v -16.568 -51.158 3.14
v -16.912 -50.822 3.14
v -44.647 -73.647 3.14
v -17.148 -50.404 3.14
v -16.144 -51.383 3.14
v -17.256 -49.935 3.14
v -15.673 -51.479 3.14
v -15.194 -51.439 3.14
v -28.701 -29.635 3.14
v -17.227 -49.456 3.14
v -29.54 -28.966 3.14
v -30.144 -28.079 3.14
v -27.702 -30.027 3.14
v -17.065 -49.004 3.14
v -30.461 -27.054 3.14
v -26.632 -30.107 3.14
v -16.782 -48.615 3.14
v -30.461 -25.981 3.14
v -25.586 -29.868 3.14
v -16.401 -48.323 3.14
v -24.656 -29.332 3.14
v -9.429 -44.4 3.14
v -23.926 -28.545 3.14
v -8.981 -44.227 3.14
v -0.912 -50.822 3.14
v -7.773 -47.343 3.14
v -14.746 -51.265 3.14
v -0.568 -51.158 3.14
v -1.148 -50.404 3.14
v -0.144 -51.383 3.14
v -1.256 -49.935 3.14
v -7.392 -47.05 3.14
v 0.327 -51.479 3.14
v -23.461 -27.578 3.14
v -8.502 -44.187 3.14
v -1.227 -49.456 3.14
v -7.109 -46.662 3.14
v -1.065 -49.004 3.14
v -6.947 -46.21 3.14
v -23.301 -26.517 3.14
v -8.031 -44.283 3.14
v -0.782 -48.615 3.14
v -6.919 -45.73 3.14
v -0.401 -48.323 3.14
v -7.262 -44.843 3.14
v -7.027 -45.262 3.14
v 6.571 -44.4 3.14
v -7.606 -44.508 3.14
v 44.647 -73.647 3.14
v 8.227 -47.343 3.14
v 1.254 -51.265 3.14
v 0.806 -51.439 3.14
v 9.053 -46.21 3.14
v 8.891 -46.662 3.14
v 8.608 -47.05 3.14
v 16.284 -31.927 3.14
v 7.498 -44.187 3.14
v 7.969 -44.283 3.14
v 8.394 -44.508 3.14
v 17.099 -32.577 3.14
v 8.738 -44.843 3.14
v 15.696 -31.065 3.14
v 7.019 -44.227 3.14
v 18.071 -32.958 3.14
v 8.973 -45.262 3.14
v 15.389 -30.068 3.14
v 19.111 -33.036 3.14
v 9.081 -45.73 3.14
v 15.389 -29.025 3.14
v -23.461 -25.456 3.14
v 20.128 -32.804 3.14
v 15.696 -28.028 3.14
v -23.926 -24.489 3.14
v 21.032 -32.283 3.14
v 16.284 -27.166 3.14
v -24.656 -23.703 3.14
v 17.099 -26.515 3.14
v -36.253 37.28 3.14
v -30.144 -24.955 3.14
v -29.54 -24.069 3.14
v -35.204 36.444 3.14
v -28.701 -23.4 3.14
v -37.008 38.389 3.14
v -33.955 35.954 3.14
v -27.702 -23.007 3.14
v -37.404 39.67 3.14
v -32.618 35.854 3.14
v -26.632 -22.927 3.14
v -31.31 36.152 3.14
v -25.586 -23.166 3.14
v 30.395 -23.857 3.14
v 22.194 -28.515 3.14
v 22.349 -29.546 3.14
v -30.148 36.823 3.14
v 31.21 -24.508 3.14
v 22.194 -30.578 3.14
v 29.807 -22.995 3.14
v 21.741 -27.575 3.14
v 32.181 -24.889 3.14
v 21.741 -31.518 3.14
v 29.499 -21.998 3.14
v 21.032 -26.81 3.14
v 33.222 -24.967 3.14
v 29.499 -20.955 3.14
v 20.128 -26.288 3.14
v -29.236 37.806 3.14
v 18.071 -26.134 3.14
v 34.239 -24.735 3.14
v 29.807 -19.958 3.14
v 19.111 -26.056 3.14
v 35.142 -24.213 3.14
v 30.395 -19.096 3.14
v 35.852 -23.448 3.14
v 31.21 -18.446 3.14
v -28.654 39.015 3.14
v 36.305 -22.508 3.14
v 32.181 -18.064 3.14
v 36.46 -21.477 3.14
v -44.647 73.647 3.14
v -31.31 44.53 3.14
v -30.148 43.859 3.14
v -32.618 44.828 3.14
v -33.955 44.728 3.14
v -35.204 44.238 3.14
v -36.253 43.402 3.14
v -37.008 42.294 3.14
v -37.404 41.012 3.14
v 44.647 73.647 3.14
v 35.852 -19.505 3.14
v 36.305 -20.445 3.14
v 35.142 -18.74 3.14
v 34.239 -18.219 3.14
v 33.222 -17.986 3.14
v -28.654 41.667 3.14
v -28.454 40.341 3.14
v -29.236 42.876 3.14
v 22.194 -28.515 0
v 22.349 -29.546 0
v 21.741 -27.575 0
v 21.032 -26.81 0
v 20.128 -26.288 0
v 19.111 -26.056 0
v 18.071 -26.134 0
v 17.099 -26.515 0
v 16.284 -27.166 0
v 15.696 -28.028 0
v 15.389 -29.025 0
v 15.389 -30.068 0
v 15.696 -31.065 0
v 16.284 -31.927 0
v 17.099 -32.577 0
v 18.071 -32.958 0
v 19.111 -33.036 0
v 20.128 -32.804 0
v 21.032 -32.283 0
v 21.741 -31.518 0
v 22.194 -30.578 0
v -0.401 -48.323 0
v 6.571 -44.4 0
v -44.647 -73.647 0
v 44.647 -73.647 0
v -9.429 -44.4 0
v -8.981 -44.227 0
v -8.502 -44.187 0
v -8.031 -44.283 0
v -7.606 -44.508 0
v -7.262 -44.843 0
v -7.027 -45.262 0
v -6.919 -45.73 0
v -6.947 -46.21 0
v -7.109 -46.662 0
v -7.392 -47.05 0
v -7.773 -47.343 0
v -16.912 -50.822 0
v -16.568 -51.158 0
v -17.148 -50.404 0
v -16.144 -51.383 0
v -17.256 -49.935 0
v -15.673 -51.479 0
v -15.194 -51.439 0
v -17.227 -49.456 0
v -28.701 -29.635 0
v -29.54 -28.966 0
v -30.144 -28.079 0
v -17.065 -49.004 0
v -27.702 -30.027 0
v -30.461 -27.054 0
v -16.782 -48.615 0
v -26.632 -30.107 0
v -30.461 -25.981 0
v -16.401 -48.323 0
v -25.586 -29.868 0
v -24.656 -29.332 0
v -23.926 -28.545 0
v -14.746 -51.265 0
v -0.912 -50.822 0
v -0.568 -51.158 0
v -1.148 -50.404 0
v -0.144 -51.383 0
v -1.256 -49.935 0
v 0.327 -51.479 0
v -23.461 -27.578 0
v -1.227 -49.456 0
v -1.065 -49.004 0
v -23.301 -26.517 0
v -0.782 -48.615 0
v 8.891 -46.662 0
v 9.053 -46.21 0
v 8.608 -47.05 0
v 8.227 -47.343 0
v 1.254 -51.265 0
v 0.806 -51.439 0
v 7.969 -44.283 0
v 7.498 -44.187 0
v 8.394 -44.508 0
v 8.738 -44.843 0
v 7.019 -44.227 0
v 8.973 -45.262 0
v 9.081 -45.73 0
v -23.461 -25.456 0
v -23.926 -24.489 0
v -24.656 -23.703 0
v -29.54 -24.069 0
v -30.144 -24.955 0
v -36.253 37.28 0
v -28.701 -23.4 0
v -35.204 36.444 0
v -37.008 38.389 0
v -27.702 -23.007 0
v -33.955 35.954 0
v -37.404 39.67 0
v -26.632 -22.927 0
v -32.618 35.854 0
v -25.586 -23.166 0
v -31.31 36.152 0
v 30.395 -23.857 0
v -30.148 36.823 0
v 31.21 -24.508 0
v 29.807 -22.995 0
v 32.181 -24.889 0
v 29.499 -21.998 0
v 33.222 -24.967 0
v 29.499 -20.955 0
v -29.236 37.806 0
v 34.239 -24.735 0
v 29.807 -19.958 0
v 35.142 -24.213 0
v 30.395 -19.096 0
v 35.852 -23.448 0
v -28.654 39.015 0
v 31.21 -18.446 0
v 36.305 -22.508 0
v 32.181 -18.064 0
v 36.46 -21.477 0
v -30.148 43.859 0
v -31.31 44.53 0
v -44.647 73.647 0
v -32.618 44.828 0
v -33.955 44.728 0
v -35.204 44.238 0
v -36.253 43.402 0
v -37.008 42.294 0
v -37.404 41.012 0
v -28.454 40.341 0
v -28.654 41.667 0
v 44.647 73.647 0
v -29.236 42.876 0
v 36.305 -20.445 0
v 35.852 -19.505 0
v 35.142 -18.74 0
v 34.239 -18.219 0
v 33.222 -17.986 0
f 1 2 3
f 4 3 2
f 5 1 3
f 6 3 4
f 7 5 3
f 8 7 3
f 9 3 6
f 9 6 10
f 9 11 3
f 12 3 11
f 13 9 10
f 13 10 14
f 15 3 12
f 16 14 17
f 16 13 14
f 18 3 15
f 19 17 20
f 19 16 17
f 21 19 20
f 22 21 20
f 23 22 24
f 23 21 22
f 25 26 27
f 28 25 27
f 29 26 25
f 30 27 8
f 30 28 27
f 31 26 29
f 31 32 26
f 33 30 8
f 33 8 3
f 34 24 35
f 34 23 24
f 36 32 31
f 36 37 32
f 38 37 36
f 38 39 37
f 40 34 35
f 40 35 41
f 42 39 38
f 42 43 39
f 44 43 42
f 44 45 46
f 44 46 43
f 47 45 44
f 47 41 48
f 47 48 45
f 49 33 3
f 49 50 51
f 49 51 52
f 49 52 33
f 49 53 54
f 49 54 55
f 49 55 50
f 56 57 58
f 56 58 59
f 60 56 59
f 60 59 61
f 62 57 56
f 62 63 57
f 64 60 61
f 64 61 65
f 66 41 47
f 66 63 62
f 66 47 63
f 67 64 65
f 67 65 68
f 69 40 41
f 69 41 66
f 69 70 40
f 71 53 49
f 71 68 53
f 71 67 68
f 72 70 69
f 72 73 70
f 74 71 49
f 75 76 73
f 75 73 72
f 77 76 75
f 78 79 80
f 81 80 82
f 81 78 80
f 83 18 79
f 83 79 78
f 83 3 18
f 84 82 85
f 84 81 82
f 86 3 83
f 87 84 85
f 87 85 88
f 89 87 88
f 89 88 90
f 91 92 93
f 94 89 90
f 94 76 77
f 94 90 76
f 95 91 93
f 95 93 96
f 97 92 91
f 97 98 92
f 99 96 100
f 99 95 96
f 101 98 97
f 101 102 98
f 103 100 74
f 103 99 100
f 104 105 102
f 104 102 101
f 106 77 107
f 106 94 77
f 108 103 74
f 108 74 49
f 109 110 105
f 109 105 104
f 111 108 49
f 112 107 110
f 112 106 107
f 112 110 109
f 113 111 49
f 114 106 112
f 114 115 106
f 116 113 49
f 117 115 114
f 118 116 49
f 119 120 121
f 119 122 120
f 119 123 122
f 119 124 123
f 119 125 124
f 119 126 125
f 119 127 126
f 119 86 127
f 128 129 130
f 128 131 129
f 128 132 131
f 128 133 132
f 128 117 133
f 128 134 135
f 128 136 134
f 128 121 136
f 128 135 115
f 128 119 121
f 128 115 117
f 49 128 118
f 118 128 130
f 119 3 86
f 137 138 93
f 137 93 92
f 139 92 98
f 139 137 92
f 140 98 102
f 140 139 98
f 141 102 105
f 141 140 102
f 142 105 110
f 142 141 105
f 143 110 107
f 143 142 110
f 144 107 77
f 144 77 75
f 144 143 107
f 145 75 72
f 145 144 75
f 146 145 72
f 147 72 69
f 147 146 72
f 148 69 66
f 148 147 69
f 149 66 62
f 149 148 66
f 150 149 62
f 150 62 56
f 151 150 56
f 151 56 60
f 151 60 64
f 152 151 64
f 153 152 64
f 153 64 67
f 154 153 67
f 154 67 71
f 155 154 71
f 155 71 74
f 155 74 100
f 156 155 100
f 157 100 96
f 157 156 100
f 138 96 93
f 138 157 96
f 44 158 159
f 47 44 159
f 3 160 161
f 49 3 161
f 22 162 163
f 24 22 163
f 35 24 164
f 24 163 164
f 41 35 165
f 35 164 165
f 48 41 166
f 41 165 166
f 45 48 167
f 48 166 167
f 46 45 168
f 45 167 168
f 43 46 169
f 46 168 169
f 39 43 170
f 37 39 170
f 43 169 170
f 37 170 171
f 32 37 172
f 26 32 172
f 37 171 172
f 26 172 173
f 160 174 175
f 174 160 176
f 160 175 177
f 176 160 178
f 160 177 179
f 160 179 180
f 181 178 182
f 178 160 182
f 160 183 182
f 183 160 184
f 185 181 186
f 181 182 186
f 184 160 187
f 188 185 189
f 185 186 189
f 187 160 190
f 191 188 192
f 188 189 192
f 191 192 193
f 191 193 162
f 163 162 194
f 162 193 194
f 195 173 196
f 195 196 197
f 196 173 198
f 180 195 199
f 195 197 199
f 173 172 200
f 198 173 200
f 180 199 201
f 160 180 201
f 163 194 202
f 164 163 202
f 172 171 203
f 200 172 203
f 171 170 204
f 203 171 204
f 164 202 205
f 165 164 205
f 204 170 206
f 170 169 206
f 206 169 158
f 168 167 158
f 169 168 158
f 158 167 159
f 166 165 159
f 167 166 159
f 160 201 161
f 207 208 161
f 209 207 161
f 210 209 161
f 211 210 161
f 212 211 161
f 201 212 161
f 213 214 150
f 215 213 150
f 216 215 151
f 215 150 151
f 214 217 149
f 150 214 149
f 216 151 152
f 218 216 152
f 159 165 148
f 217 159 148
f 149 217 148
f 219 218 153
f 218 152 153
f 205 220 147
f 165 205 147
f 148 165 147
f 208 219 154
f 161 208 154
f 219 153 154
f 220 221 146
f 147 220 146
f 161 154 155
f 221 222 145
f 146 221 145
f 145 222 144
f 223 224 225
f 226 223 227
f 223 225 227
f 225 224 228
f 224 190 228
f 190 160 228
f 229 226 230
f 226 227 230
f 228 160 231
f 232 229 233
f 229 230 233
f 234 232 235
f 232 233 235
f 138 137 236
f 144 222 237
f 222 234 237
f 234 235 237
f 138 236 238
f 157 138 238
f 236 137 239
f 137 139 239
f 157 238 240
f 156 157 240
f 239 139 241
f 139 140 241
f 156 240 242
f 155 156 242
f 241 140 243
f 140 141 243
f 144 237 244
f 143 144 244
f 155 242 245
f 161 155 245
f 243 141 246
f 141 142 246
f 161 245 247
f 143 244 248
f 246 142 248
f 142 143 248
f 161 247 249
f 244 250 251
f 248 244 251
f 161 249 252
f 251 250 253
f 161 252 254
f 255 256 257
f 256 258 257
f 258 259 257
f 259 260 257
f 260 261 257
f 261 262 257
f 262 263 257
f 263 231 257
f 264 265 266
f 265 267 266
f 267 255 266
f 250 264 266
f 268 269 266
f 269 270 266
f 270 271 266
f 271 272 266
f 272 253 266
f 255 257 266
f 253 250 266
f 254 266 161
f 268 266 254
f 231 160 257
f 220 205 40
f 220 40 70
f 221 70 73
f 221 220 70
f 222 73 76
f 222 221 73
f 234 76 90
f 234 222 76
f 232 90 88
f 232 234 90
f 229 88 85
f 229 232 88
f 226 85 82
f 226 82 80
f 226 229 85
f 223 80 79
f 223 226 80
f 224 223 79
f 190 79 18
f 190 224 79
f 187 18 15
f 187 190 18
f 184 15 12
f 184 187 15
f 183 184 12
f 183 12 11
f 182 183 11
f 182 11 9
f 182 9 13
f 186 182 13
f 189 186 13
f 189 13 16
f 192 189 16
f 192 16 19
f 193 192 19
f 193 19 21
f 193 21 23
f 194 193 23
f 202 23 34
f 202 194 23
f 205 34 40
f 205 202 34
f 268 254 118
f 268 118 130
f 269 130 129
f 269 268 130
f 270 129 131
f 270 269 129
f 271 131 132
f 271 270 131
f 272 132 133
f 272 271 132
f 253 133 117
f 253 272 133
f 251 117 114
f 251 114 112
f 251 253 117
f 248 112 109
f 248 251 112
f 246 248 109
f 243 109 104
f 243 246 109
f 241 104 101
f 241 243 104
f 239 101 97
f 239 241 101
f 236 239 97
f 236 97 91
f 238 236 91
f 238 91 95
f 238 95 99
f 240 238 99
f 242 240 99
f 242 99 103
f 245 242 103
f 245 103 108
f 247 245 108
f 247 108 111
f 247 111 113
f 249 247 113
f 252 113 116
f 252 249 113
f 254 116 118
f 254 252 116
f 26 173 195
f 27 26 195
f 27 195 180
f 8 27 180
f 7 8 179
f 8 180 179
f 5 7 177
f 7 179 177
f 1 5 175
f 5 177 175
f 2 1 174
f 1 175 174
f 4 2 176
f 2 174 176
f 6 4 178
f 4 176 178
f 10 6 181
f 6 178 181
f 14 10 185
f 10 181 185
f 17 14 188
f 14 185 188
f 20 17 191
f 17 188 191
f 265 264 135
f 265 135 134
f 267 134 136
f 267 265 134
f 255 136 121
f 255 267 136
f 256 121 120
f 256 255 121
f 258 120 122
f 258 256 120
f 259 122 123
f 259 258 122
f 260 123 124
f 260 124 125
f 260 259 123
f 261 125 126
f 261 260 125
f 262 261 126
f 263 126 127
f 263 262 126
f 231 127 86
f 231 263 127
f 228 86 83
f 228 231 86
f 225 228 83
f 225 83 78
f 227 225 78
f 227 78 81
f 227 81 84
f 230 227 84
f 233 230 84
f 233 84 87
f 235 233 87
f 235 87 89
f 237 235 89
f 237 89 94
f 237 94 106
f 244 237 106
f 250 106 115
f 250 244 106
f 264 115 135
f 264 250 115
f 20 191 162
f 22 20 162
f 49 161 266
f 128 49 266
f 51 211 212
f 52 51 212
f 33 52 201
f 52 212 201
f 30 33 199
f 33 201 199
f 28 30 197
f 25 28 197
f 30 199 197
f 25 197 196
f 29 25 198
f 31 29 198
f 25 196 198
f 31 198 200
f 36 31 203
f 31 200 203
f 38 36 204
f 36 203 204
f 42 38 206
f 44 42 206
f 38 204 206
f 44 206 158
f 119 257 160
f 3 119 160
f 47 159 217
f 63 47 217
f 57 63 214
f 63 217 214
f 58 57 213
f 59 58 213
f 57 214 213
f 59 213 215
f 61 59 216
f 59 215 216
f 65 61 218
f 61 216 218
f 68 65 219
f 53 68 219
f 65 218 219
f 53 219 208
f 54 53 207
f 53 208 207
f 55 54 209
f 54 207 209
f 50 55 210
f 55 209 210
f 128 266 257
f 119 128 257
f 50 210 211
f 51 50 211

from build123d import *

# Parameters (mm, degrees)
SKETCH1_R           = 3.6
SKETCH1_R_2         = 3.5
SKETCH1_R_3         = 4.5
BOSS_EXTRUDE1_DEPTH = 3.14


with BuildPart() as part:
    # Sketch1 → Boss-Extrude1 (new body)
    # profile 1 of 10: a face of its own
    with BuildSketch(Plane.XY):
        with BuildLine():
            Line((38.651827519, 73.647136153), (-26.230787773, 73.647136153))
            Line((-26.230787773, 73.647136153), (-41.648963672, 73.647136153))
            add(Edge.make_bspline(
                [(-41.648963672, 73.647136153), (-44.643488897, 73.643488897), (-44.647136153, 70.648963672)],
                knots=[3.927599805, 3.927599805, 3.927599805, 5.497178156, 5.497178156, 5.497178156], degree=2, weights=[1, 0.707537269, 1]))
            Line((-44.647136153, 70.648963672), (-44.647136153, -70.648963672))
            add(Edge.make_bspline(
                [(-44.647136153, -70.648963672), (-44.643488897, -73.643488897), (-41.648963672, -73.647136153)],
                knots=[3.927599805, 3.927599805, 3.927599805, 5.497178156, 5.497178156, 5.497178156], degree=2, weights=[1, 0.707537269, 1]))
            Line((-41.648963672, -73.647136153), (27.093393639, -73.647136153))
            add(Edge.make_bspline(
                [(44.647136153, -54.550700861), (44.629350083, -55.622608831), (44.523578432, -56.687840097), (44.215717336, -58.366181711), (44.071515423, -58.983678353), (43.719242041, -60.213836545), (43.51280516, -60.820227412), (42.807525079, -62.600781834), (42.22206304, -63.742215888), (41.337337041, -65.108539745), (41.152542037, -65.37883334), (40.771685792, -65.906986664), (40.57512321, -66.165654002), (39.967232089, -66.92560473), (39.108255703, -67.89614606), (38.152323748, -68.781197278), (37.146406736, -69.622175477), (36.615243643, -70.022491506), (34.981146078, -71.128530207), (33.83112161, -71.747972893), (32.318701378, -72.376617626), (32.012437216, -72.49499434), (31.392225647, -72.716804064), (31.077608459, -72.820394039), (30.133341911, -73.105042114), (29.500121034, -73.261325902), (28.276366882, -73.499851982), (27.686391293, -73.587126278), (27.093393639, -73.647136153)],
                knots=[0.018260035, 0.018260035, 0.018260035, 0.018260035, 0.125, 0.125, 0.1875, 0.1875, 0.25, 0.25, 0.375, 0.375, 0.40625, 0.40625, 0.4375, 0.4375, 0.5, 0.5625, 0.5625, 0.625, 0.625, 0.75, 0.75, 0.78125, 0.78125, 0.8125, 0.8125, 0.875, 0.875, 0.932610516, 0.932610516, 0.932610516, 0.932610516], degree=3))
            Line((44.647136153, -54.550700861), (44.647136153, -53.896039233))
            Line((44.647136153, -53.896039233), (44.647136153, 22.020325098))
            ThreePointArc((44.647136153, 22.020325098), (42.730516554, 17.699527097), (39.139308268, 14.626100819))
            Line((39.139308268, 14.626100819), (39.139308268, 13.683084381))
            ThreePointArc((39.139308268, 13.683084381), (36.430045993, 7.142346655), (29.889308268, 4.433084381))
            Line((29.889308268, 4.433084381), (-36.027217939, 4.433084381))
            ThreePointArc((-36.027217939, 4.433084381), (-37.794984892, 5.165317428), (-38.527217939, 6.933084381))
            Line((-38.527217939, 6.933084381), (-38.527217939, 60.005147218))
            ThreePointArc((-38.527217939, 60.005147218), (-37.794984892, 61.772914171), (-36.027217939, 62.505147218))
            Line((-36.027217939, 62.505147218), (36.639308268, 62.505147218))
            ThreePointArc((36.639308268, 62.505147218), (38.40707522, 61.772914171), (39.139308268, 60.005147218))
            Line((39.139308268, 60.005147218), (39.139308268, 33.556674407))
            ThreePointArc((39.139308268, 33.556674407), (42.730516554, 30.483248128), (44.647136153, 26.162450128))
            Line((44.647136153, 26.162450128), (44.647136153, 67.670503394))
            Line((44.647136153, 67.670503394), (44.647136153, 70.648963672))
            add(Edge.make_bspline(
                [(44.647136153, 70.648963672), (44.643488897, 73.643488897), (41.648963672, 73.647136153)],
                knots=[3.927599805, 3.927599805, 3.927599805, 5.497178156, 5.497178156, 5.497178156], degree=2, weights=[1, 0.707537269, 1]))
            Line((41.648963672, 73.647136153), (38.651827519, 73.647136153))
        make_face()
        with BuildLine():
            ThreePointArc((-14.745996033, -51.265124074), (-17.044884469, -50.621435312), (-16.401195707, -48.322546875))
            Line((-16.401195707, -48.322546875), (-9.42859141, -44.400456958))
            ThreePointArc((-9.42859141, -44.400456958), (-7.129702973, -45.04414572), (-7.773391736, -47.343034157))
            Line((-7.773391736, -47.343034157), (-14.745996033, -51.265124074))
        make_face(mode=Mode.SUBTRACT)
        with Locations((-26.900831216, -26.517202566)):
            Circle(SKETCH1_R, mode=Mode.SUBTRACT)
        with BuildLine():
            ThreePointArc((1.254003967, -51.265124074), (-1.044884469, -50.621435312), (-0.401195707, -48.322546875))
            Line((-0.401195707, -48.322546875), (6.57140859, -44.400456958))
            ThreePointArc((6.57140859, -44.400456958), (8.870297027, -45.04414572), (8.226608264, -47.343034157))
            Line((8.226608264, -47.343034157), (1.254003967, -51.265124074))
        make_face(mode=Mode.SUBTRACT)
        with Locations((18.849494268, -29.546234455)):
            Circle(SKETCH1_R_2, mode=Mode.SUBTRACT)
        with Locations((32.960239, -21.476652312)):
            Circle(SKETCH1_R_2, mode=Mode.SUBTRACT)
    # profile 2 of 10: a face of its own
    with BuildSketch(Plane.XY):
        with BuildLine():
            add(Edge.make_bspline(
                [(-41.648963672, 73.647136153), (-44.643488897, 73.643488897), (-44.647136153, 70.648963672)],
                knots=[3.927599805, 3.927599805, 3.927599805, 5.497178156, 5.497178156, 5.497178156], degree=2, weights=[1, 0.707537269, 1]))
            Line((-41.648963672, 73.647136153), (-44.647136153, 73.647136153))
            Line((-44.647136153, 73.647136153), (-44.647136153, 70.648963672))
        make_face()
    # profile 3 of 10: a face of its own
    with BuildSketch(Plane.XY):
        with BuildLine():
            Line((44.647136153, 73.647136153), (41.648963672, 73.647136153))
            add(Edge.make_bspline(
                [(44.647136153, 70.648963672), (44.643488897, 73.643488897), (41.648963672, 73.647136153)],
                knots=[3.927599805, 3.927599805, 3.927599805, 5.497178156, 5.497178156, 5.497178156], degree=2, weights=[1, 0.707537269, 1]))
            Line((44.647136153, 70.648963672), (44.647136153, 73.647136153))
        make_face()
    # profile 4 of 10: a face of its own
    with BuildSketch(Plane.XY):
        with BuildLine():
            add(Edge.make_bspline(
                [(-44.647136153, -70.648963672), (-44.643488897, -73.643488897), (-41.648963672, -73.647136153)],
                knots=[3.927599805, 3.927599805, 3.927599805, 5.497178156, 5.497178156, 5.497178156], degree=2, weights=[1, 0.707537269, 1]))
            Line((-44.647136153, -70.648963672), (-44.647136153, -73.647136153))
            Line((-44.647136153, -73.647136153), (-41.648963672, -73.647136153))
        make_face()
    # profile 5 of 10: a face of its own
    with BuildSketch(Plane.XY):
        with BuildLine():
            Line((44.647136153, 22.020325098), (44.647136153, 26.162450128))
            ThreePointArc((44.647136153, 26.162450128), (42.730516554, 30.483248128), (39.139308268, 33.556674407))
            Line((39.139308268, 33.556674407), (39.139308268, 14.626100819))
            ThreePointArc((39.139308268, 14.626100819), (42.730516554, 17.699527097), (44.647136153, 22.020325098))
        make_face()
    # profile 6 of 10: a face of its own
    with BuildSketch(Plane.XY):
        with BuildLine():
            add(Edge.make_bspline(
                [(44.647136153, -54.550700861), (44.629350083, -55.622608831), (44.523578432, -56.687840097), (44.215717336, -58.366181711), (44.071515423, -58.983678353), (43.719242041, -60.213836545), (43.51280516, -60.820227412), (42.807525079, -62.600781834), (42.22206304, -63.742215888), (41.337337041, -65.108539745), (41.152542037, -65.37883334), (40.771685792, -65.906986664), (40.57512321, -66.165654002), (39.967232089, -66.92560473), (39.108255703, -67.89614606), (38.152323748, -68.781197278), (37.146406736, -69.622175477), (36.615243643, -70.022491506), (34.981146078, -71.128530207), (33.83112161, -71.747972893), (32.318701378, -72.376617626), (32.012437216, -72.49499434), (31.392225647, -72.716804064), (31.077608459, -72.820394039), (30.133341911, -73.105042114), (29.500121034, -73.261325902), (28.276366882, -73.499851982), (27.686391293, -73.587126278), (27.093393639, -73.647136153)],
                knots=[0.018260035, 0.018260035, 0.018260035, 0.018260035, 0.125, 0.125, 0.1875, 0.1875, 0.25, 0.25, 0.375, 0.375, 0.40625, 0.40625, 0.4375, 0.4375, 0.5, 0.5625, 0.5625, 0.625, 0.625, 0.75, 0.75, 0.78125, 0.78125, 0.8125, 0.8125, 0.875, 0.875, 0.932610516, 0.932610516, 0.932610516, 0.932610516], degree=3))
            Line((27.093393639, -73.647136153), (44.647136153, -73.647136153))
            Line((44.647136153, -73.647136153), (44.647136153, -54.550700861))
        make_face()
    # profile 7 of 10: a face of its own
    with BuildSketch(Plane.XY):
        with BuildLine():
            ThreePointArc((24.922228065, 29.508743732), (31.21939997, 34.382384037), (39.139308268, 33.556674407))
            Line((39.139308268, 33.556674407), (39.139308268, 60.005147218))
            ThreePointArc((39.139308268, 60.005147218), (38.40707522, 61.772914171), (36.639308268, 62.505147218))
            Line((36.639308268, 62.505147218), (-36.027217939, 62.505147218))
            ThreePointArc((-36.027217939, 62.505147218), (-37.794984892, 61.772914171), (-38.527217939, 60.005147218))
            Line((-38.527217939, 60.005147218), (-38.527217939, 6.933084381))
            ThreePointArc((-38.527217939, 6.933084381), (-37.794984892, 5.165317428), (-36.027217939, 4.433084381))
            Line((-36.027217939, 4.433084381), (29.889308268, 4.433084381))
            ThreePointArc((29.889308268, 4.433084381), (36.430045993, 7.142346655), (39.139308268, 13.683084381))
            Line((39.139308268, 13.683084381), (39.139308268, 14.626100819))
            ThreePointArc((39.139308268, 14.626100819), (31.21939997, 13.800391189), (24.922228065, 18.674031494))
            Line((24.922228065, 18.674031494), (24.922228065, 10.28797778))
            Line((24.922228065, 10.28797778), (-25.167870173, 10.28797778))
            Line((-25.167870173, 10.28797778), (-25.167870173, 56.21628744))
            Line((-25.167870173, 56.21628744), (24.922228065, 56.21628744))
            Line((24.922228065, 56.21628744), (24.922228065, 29.508743732))
        make_face()
        with Locations((-32.953932198, 40.341063425)):
            Circle(SKETCH1_R_3, mode=Mode.SUBTRACT)
    # profile 8 of 10: a face of its own
    with BuildSketch(Plane.XY):
        with BuildLine():
            Line((39.139308268, 14.626100819), (39.139308268, 33.556674407))
            ThreePointArc((39.139308268, 33.556674407), (31.21939997, 34.382384037), (24.922228065, 29.508743732))
            Line((24.922228065, 29.508743732), (24.922228065, 18.674031494))
            ThreePointArc((24.922228065, 18.674031494), (31.21939997, 13.800391189), (39.139308268, 14.626100819))
        make_face()
    # profile 9 of 10: a face of its own
    with BuildSketch(Plane.XY):
        with BuildLine():
            ThreePointArc((24.922228065, 18.674031494), (23.449484032, 24.091387613), (24.922228065, 29.508743732))
            Line((24.922228065, 29.508743732), (24.922228065, 56.21628744))
            Line((24.922228065, 56.21628744), (-25.167870173, 56.21628744))
            Line((-25.167870173, 56.21628744), (-25.167870173, 10.28797778))
            Line((-25.167870173, 10.28797778), (24.922228065, 10.28797778))
            Line((24.922228065, 10.28797778), (24.922228065, 18.674031494))
        make_face()
    # profile 10 of 10: a face of its own
    with BuildSketch(Plane.XY):
        with BuildLine():
            Line((24.922228065, 18.674031494), (24.922228065, 29.508743732))
            ThreePointArc((24.922228065, 29.508743732), (23.449484032, 24.091387613), (24.922228065, 18.674031494))
        make_face()
    extrude(amount=BOSS_EXTRUDE1_DEPTH)


solid = part.part
